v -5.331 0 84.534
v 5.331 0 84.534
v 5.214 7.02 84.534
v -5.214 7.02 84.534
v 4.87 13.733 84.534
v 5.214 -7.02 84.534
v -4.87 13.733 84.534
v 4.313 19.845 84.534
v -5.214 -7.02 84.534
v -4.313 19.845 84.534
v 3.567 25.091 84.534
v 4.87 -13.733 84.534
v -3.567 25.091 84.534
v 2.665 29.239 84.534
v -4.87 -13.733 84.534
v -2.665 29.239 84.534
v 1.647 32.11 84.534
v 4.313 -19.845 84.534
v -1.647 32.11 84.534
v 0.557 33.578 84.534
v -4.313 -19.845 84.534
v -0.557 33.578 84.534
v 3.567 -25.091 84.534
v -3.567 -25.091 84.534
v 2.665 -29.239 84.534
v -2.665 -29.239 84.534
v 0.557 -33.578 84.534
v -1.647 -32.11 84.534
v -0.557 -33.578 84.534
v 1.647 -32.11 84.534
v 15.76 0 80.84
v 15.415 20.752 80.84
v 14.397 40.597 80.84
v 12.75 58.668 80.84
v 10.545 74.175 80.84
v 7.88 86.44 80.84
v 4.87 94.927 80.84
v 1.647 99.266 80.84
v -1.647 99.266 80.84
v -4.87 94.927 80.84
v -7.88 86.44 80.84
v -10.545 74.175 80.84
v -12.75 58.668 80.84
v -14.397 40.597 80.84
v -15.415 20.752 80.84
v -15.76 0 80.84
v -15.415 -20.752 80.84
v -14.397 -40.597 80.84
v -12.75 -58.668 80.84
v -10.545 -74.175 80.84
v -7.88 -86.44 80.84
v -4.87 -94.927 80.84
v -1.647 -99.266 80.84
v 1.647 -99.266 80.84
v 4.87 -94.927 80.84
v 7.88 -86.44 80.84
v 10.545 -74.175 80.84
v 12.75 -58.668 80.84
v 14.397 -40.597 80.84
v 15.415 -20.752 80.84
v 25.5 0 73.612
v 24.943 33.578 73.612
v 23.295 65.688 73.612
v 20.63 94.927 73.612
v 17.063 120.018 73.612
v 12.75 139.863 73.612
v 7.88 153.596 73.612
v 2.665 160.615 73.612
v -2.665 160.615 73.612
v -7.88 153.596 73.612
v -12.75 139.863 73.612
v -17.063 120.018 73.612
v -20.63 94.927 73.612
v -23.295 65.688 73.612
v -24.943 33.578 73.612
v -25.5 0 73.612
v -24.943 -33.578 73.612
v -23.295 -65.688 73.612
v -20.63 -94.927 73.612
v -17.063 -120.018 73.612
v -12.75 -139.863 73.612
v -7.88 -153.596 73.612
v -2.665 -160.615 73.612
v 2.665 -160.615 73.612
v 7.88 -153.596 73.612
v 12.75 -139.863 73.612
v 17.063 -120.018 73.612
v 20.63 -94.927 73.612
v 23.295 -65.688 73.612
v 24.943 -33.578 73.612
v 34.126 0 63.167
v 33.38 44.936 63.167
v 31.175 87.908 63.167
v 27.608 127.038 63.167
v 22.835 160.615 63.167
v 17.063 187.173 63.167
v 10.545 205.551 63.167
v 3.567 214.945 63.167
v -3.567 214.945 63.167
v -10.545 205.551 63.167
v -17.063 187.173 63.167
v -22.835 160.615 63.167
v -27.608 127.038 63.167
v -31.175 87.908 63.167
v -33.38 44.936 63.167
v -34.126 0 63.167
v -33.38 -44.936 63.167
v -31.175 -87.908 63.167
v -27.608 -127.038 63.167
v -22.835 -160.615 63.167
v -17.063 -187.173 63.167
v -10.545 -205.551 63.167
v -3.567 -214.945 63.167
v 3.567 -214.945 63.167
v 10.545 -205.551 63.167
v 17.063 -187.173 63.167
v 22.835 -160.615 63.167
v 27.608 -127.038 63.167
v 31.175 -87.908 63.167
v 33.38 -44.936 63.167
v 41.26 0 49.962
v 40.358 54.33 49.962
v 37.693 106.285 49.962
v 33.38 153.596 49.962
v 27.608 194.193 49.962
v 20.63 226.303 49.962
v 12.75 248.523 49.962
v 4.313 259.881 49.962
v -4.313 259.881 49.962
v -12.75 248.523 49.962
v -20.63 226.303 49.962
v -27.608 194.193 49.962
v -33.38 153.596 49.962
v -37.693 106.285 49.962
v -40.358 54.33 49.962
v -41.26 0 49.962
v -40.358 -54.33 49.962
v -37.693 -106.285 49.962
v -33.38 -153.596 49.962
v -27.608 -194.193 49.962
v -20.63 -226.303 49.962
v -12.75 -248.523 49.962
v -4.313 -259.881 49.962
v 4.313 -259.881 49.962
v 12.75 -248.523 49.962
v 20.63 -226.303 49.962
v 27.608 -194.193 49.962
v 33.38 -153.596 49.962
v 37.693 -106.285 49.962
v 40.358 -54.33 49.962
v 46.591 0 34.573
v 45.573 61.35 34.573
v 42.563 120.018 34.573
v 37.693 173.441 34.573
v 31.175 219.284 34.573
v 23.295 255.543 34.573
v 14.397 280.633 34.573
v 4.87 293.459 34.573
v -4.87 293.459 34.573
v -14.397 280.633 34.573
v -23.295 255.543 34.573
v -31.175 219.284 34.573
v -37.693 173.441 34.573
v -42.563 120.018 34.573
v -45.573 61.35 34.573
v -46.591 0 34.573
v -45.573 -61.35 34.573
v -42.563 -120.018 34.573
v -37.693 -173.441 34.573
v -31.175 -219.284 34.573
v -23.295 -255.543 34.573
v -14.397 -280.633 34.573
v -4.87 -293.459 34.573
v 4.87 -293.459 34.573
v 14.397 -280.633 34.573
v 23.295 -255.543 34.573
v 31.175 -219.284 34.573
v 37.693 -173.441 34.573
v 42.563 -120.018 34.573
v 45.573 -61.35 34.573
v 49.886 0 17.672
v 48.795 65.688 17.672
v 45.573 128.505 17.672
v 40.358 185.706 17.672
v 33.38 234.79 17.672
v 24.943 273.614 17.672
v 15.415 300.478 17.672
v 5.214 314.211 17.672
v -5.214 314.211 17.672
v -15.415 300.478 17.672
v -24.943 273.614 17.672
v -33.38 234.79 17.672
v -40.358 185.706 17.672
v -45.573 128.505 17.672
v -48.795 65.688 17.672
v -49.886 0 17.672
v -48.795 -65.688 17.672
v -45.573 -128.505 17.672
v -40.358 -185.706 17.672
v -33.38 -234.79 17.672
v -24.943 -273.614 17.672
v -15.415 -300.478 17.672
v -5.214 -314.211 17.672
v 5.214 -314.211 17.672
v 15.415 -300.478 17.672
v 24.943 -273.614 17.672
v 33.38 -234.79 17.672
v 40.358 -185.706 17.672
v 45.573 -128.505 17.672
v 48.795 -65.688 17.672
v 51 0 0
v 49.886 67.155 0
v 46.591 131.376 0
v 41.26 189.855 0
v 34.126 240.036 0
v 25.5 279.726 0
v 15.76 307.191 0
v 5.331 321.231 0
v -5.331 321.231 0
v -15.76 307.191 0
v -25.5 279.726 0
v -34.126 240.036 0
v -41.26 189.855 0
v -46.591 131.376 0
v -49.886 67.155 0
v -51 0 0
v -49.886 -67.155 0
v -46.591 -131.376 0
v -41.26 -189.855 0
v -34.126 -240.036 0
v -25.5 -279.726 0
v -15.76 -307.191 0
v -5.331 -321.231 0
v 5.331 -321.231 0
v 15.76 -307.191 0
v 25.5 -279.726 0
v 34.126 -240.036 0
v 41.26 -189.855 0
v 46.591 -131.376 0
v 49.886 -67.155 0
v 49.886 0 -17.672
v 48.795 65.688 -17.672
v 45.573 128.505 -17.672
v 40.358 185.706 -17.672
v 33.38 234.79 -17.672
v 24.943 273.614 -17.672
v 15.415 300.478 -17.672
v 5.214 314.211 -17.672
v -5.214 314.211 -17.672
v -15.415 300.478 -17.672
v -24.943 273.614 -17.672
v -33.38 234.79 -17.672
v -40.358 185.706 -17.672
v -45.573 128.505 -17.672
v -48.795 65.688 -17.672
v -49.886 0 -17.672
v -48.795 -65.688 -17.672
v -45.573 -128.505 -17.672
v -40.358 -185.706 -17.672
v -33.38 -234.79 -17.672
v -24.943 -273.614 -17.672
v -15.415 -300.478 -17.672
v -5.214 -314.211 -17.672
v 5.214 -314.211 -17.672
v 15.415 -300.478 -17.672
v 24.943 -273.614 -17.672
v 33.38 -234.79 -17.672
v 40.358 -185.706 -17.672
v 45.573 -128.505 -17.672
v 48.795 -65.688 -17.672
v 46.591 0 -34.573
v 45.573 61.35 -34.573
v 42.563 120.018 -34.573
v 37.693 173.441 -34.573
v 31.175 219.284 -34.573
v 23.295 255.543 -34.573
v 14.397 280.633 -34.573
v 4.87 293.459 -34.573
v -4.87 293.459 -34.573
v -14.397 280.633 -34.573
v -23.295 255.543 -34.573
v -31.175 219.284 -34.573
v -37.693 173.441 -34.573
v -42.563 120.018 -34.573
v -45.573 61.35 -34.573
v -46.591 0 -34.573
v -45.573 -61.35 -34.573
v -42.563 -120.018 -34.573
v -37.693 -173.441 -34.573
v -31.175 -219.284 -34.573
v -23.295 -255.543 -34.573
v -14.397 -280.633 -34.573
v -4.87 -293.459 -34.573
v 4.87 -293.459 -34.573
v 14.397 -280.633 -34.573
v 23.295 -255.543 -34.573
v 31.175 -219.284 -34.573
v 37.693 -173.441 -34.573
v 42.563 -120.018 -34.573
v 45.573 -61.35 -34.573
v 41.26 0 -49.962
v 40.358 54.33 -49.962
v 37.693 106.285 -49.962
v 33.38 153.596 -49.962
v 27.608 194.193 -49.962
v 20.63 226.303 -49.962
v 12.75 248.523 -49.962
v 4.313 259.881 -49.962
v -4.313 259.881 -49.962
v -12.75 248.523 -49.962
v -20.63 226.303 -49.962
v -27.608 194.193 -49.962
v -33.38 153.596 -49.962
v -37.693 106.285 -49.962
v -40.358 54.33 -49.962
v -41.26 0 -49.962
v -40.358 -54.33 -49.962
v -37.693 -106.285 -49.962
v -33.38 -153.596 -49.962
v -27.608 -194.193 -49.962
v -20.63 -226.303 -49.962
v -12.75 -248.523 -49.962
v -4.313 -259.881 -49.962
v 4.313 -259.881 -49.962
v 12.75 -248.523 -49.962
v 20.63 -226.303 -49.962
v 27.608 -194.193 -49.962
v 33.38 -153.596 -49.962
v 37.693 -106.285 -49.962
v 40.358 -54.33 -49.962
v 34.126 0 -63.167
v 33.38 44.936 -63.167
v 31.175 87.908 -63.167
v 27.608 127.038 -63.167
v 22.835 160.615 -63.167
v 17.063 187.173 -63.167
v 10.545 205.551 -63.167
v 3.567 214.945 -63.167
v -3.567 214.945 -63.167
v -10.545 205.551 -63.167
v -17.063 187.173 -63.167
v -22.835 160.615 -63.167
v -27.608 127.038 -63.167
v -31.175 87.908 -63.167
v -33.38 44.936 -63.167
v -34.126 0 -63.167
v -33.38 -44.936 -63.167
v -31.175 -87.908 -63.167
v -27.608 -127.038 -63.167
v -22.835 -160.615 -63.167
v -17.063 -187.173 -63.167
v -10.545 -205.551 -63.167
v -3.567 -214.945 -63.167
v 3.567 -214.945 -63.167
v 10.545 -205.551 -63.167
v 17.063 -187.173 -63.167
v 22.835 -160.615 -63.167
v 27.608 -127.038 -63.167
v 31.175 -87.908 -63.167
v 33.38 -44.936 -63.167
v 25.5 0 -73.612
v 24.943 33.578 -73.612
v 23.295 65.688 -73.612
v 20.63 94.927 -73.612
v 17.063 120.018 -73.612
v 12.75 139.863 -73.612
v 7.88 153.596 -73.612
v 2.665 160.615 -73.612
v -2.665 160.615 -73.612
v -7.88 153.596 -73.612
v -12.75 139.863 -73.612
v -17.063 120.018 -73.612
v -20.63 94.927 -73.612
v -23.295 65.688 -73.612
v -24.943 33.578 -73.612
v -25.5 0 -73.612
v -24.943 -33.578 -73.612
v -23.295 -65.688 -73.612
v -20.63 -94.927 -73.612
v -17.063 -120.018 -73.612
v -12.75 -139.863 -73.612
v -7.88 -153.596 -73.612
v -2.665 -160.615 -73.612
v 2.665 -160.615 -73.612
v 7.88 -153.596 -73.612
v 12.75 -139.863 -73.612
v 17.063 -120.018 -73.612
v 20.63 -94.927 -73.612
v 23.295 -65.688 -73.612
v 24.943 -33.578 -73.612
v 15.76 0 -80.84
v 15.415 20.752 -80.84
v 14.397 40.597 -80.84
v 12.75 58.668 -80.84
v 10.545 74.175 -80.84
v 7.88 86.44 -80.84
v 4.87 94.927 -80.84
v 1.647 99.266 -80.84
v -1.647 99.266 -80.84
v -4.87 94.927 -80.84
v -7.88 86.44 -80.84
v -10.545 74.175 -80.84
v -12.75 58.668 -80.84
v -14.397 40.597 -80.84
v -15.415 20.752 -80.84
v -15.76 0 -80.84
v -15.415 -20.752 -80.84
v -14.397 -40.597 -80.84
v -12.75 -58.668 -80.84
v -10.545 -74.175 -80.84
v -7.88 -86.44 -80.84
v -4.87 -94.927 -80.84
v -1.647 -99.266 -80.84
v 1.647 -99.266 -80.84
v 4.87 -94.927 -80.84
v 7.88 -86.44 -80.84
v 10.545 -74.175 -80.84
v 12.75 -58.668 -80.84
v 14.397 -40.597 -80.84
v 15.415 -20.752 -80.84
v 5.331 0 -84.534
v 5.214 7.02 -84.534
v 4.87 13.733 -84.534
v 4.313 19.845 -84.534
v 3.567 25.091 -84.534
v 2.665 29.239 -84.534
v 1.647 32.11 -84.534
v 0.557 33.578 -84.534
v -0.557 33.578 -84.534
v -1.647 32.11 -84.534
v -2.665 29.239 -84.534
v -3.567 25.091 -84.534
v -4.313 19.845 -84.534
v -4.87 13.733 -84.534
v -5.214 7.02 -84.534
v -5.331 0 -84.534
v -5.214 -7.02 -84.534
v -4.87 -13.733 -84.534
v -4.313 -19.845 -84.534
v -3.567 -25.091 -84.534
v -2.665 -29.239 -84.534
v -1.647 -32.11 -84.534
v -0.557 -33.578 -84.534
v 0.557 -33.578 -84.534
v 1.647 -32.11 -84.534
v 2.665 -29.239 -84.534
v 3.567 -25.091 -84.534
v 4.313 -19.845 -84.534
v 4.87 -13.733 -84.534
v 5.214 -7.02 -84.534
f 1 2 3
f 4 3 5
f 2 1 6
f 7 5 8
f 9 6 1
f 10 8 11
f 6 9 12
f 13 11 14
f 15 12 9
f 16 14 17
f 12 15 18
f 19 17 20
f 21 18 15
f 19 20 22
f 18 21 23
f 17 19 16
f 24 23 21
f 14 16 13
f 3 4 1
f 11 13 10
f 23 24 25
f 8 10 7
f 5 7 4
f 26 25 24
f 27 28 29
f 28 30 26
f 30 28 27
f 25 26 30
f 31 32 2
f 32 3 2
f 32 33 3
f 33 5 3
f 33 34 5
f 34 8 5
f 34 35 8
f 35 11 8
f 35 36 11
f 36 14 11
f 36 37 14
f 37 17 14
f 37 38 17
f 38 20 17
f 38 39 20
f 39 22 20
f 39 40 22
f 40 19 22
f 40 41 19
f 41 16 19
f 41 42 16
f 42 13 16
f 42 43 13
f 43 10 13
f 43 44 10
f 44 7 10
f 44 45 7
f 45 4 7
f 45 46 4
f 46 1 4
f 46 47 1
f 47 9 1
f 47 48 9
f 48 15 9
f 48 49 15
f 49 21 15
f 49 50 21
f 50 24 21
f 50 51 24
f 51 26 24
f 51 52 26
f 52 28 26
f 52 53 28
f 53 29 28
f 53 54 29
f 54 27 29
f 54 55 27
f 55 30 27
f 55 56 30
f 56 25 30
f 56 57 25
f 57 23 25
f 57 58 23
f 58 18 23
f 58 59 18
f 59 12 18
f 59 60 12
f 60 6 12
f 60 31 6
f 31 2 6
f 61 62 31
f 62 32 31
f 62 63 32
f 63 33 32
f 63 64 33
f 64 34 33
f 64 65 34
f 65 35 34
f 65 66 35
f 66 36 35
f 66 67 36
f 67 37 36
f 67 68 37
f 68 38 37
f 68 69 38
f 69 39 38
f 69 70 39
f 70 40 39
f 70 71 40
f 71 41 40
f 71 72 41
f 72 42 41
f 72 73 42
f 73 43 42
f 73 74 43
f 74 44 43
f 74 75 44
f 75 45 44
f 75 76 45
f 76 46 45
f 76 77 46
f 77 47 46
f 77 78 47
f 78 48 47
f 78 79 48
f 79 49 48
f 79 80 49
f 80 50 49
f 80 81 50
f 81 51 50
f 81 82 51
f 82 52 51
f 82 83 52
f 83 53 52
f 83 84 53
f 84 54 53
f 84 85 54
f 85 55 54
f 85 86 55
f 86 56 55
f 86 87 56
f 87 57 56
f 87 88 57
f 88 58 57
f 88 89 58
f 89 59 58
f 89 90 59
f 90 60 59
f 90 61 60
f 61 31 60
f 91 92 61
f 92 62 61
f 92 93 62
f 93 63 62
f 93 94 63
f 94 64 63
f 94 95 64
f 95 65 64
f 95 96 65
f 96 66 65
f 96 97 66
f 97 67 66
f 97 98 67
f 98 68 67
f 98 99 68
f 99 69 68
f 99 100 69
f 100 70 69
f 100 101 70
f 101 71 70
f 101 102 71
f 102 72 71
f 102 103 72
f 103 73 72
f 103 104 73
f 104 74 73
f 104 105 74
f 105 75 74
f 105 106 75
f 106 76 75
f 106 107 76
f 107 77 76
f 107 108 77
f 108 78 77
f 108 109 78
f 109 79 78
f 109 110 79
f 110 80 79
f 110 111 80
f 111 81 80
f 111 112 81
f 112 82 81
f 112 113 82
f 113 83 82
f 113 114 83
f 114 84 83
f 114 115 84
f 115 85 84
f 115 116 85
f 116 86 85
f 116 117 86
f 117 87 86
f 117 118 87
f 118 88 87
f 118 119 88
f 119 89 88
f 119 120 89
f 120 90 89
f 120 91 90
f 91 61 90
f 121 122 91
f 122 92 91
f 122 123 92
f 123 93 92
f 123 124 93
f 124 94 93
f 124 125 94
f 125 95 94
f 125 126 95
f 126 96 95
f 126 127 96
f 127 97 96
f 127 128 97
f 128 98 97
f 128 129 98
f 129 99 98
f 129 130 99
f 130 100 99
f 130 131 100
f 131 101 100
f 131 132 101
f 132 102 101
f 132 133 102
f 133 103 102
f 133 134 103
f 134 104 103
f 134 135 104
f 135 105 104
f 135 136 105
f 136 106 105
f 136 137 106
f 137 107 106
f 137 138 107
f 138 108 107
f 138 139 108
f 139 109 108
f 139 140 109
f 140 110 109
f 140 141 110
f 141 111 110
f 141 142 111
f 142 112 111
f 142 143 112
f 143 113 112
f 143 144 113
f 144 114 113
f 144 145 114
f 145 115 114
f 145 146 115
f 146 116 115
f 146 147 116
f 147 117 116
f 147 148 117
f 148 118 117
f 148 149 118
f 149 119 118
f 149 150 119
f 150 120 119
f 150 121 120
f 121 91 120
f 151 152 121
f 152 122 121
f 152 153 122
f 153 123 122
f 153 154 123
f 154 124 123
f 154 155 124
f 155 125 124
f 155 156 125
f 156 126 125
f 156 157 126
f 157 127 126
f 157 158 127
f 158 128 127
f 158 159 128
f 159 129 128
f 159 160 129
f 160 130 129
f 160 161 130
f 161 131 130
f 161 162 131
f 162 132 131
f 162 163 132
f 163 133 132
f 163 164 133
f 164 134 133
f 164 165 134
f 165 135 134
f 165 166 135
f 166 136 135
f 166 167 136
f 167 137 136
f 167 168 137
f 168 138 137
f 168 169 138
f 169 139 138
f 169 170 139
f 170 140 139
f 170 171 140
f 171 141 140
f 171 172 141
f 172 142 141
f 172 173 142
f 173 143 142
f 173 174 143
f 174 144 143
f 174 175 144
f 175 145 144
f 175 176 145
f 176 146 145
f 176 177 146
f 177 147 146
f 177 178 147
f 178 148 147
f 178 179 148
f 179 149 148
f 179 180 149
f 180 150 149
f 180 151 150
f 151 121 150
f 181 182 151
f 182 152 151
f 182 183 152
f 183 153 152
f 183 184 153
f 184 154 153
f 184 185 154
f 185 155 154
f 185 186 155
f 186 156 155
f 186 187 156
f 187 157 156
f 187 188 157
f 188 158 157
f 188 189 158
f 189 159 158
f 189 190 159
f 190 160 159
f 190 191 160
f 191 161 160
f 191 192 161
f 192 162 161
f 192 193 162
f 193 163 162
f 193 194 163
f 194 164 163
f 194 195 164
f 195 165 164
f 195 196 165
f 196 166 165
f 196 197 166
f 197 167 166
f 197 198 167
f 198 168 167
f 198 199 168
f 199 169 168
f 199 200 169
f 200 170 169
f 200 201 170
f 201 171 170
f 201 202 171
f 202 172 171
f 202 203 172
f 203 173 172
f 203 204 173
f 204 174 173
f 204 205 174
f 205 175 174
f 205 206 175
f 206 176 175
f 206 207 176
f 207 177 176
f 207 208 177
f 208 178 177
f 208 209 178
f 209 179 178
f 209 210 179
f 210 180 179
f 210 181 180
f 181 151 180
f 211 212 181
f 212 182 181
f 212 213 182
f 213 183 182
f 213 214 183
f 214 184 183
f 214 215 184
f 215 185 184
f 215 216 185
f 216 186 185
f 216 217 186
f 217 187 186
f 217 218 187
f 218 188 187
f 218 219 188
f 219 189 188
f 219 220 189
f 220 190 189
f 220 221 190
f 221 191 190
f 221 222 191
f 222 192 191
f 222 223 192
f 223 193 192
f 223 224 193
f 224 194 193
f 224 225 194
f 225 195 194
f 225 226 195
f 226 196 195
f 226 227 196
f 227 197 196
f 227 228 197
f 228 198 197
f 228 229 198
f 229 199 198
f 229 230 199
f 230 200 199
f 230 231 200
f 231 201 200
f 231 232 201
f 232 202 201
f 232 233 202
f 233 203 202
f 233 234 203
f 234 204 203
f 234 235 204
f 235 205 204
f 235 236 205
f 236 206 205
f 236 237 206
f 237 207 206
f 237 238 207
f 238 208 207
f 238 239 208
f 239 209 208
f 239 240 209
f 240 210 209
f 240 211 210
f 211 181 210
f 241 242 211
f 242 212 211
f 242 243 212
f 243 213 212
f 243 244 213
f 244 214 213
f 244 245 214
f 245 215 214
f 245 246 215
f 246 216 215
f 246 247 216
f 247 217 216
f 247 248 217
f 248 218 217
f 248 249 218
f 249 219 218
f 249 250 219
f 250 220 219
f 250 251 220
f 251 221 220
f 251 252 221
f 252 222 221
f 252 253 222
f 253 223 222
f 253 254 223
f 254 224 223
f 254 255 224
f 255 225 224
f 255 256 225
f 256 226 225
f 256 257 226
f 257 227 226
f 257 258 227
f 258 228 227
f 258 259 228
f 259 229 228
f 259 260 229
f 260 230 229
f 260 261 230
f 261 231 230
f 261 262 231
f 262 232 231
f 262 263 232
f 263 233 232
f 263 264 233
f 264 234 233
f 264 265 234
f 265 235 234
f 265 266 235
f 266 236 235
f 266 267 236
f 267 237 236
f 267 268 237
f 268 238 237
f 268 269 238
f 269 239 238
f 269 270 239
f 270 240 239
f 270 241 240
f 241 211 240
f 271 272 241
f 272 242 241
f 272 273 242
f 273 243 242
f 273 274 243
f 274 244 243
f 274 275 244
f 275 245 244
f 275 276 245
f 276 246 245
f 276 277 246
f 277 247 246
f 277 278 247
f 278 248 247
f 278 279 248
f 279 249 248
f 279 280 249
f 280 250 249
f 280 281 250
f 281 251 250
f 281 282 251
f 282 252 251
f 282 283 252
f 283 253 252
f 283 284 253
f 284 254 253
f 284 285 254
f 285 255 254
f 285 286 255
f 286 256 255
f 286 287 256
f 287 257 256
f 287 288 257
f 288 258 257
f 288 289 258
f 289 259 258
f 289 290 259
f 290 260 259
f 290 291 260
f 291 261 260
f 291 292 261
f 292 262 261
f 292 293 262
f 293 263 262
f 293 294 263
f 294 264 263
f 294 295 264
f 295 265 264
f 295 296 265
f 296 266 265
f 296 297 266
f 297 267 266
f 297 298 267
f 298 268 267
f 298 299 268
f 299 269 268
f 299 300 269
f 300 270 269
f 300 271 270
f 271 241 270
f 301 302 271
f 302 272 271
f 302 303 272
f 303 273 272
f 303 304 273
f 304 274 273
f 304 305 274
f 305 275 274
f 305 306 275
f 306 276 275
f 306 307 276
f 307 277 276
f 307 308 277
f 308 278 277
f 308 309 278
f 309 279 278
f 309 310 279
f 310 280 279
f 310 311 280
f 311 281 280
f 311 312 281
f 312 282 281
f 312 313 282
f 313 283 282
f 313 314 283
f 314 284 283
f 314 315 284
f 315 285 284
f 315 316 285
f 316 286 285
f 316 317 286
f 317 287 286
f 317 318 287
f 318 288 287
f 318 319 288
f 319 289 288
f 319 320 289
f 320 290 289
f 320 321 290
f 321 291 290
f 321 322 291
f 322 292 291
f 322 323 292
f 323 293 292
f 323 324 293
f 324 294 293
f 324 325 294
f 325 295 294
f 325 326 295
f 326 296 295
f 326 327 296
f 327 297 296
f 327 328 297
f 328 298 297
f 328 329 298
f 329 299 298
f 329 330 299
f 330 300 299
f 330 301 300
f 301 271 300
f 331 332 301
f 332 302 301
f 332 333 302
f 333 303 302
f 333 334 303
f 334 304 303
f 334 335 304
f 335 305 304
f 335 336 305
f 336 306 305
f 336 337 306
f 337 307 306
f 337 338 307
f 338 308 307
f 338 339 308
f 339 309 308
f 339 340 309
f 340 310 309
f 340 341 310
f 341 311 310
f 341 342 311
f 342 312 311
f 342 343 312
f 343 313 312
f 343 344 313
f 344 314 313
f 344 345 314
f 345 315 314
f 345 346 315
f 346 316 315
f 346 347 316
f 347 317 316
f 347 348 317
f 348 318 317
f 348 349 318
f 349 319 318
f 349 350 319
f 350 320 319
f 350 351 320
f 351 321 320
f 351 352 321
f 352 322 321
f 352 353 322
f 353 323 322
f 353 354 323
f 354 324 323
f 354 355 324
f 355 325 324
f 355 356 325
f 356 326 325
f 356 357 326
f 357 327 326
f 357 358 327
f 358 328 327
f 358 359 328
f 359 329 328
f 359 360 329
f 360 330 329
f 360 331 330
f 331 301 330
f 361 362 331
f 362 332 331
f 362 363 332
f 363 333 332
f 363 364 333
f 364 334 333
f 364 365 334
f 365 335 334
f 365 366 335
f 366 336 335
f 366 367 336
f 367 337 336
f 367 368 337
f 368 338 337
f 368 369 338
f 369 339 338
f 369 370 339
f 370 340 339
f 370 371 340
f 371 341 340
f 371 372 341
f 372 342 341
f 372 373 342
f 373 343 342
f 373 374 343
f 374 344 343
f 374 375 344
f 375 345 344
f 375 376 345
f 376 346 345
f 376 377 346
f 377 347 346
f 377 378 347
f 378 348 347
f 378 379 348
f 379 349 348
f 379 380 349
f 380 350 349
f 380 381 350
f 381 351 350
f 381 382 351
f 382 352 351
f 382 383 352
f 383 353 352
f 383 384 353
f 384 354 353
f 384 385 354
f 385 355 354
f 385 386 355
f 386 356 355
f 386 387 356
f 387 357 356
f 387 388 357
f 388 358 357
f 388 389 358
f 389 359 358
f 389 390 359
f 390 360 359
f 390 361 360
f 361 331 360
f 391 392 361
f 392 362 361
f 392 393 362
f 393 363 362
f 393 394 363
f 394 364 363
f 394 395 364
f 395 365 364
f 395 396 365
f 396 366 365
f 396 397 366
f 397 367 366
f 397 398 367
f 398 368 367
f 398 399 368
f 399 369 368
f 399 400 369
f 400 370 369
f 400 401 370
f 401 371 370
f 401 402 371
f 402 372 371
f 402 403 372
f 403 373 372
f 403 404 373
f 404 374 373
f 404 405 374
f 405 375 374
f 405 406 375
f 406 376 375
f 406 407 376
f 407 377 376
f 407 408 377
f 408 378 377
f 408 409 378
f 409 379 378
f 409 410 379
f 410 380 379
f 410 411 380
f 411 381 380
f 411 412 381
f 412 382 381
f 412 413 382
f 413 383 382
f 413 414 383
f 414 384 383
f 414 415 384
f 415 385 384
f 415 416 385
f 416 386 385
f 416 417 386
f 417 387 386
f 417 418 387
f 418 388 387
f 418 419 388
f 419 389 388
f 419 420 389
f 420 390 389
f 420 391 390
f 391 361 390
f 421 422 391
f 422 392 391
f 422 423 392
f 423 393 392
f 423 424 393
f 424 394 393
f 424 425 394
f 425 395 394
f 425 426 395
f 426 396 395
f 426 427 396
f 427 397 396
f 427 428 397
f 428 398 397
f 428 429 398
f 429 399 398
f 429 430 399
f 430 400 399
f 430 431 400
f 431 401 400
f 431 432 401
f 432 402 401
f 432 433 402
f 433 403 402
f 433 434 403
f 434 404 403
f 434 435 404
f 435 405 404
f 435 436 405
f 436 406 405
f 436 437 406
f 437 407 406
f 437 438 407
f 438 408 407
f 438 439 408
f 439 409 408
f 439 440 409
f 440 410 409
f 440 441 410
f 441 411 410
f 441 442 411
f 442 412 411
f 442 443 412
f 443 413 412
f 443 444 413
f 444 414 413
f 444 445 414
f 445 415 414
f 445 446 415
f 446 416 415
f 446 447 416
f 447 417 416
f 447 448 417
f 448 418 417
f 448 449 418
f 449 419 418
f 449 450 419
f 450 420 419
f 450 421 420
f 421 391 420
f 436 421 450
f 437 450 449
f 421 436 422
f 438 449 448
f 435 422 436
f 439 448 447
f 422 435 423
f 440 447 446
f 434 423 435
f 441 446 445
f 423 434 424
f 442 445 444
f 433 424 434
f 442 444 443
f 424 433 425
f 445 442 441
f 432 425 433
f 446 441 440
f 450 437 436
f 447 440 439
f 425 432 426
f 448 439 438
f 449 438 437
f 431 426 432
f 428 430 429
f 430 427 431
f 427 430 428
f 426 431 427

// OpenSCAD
// Generated by SolidPython 1.0.1 on 2020-07-29 00:46:46


scale(v = [3, 19, 5]) {
	sphere(r = 17);
}
/***********************************************
*********      SolidPython code:      **********
************************************************
 
# import packages: SolidPython
from solid import *
from solid.utils import *
from itertools import chain, combinations, permutations


class Resize:

    def __init__(self, scad_file):
        self.scad_file = scad_file
        #self.scad_file = import_scad(scad_file)
        # cone/cylinder param:
        self.r1 = 0
        self.r2 = 0
        self.h = 0
        # rectangular prism param:
        self.w = 0
        self.l = 0
        # ellipse param:
        self.r = 0

    # import OpenScad code (file name corresponds to shape)


    # classify shape + parameters
    def assign(self, param1, param2, param3):
        if self.scad_file == 'cone.scad':
            self.r1 = param1
            self.r2 = param2
            self.h = param3
        elif self.scad_file == 'cylinder.scad':
            self.r1 = param1
            self.r2 = param2
            self.h = param3
        elif self.scad_file == 'rectangularPrism.scad':
            self.h = param1
            self.l = param2
            self.w = param3
        else:
            self.r = param1
            self.h = param2

    # resize parameters
    def iterate(self):
        x = range(3, 20, 2)
        i = 1
        if self.scad_file == 'cone.scad':
            tempList = list(permutations(x, 2))
            for temp in tempList:
                param1 = temp[0]
                param2 = temp[1]
                filepath = 'produced_scad_files/' + 'cone' + str(param1) + '_' + str(param2) + '_' + '.scad'
                scad_render_to_file(cylinder(h=param1, r1=param2, r2=0), filepath)

        elif self.scad_file == 'cylinder.scad':
            tempList = list(permutations(x, 3))
            for temp in tempList:
                param1 = temp[0]
                param2 = temp[1]
                filepath = 'produced_scad_files/' + 'cylinder' + str(param1) + '_' + str(param2) + '_' + '.scad'
                scad_render_to_file(cylinder(h=param1, r1=param2, r2=param2), filepath)

        elif self.scad_file == 'rectangularPrism.scad':
            tempList = list(permutations(x, 3))
            for temp in tempList:
                param1 = temp[0]
                param2 = temp[1]
                param3 = temp[2]
                filepath = 'produced_scad_files/' + 'rectangularPrism' + str(param1) + '_' + str(param2) + '_' + str(
                    param3) + '.scad'
                scad_render_to_file(cube(size=(param1, param2, param3)), filepath)

        elif self.scad_file == 'ellipse.scad':
            tempList = list(permutations(x, 4))
            for temp in tempList:
                param1 = temp[0]
                param2 = temp[1]
                param3 = temp[2]
                param4 = temp[3]
                filepath = 'produced_scad_files/' + 'ellipse' + str(param1) + '_' + str(param2) + '_' + str(param3) + '_' + str(param4) + '.scad'
                scad_render_to_file(scale([param1, param2, param3])(sphere(r=param4)), filepath)

    def render_to_scadfile(self):
        scad_render_to_file(scad, 'example.scad') 
 
************************************************/
